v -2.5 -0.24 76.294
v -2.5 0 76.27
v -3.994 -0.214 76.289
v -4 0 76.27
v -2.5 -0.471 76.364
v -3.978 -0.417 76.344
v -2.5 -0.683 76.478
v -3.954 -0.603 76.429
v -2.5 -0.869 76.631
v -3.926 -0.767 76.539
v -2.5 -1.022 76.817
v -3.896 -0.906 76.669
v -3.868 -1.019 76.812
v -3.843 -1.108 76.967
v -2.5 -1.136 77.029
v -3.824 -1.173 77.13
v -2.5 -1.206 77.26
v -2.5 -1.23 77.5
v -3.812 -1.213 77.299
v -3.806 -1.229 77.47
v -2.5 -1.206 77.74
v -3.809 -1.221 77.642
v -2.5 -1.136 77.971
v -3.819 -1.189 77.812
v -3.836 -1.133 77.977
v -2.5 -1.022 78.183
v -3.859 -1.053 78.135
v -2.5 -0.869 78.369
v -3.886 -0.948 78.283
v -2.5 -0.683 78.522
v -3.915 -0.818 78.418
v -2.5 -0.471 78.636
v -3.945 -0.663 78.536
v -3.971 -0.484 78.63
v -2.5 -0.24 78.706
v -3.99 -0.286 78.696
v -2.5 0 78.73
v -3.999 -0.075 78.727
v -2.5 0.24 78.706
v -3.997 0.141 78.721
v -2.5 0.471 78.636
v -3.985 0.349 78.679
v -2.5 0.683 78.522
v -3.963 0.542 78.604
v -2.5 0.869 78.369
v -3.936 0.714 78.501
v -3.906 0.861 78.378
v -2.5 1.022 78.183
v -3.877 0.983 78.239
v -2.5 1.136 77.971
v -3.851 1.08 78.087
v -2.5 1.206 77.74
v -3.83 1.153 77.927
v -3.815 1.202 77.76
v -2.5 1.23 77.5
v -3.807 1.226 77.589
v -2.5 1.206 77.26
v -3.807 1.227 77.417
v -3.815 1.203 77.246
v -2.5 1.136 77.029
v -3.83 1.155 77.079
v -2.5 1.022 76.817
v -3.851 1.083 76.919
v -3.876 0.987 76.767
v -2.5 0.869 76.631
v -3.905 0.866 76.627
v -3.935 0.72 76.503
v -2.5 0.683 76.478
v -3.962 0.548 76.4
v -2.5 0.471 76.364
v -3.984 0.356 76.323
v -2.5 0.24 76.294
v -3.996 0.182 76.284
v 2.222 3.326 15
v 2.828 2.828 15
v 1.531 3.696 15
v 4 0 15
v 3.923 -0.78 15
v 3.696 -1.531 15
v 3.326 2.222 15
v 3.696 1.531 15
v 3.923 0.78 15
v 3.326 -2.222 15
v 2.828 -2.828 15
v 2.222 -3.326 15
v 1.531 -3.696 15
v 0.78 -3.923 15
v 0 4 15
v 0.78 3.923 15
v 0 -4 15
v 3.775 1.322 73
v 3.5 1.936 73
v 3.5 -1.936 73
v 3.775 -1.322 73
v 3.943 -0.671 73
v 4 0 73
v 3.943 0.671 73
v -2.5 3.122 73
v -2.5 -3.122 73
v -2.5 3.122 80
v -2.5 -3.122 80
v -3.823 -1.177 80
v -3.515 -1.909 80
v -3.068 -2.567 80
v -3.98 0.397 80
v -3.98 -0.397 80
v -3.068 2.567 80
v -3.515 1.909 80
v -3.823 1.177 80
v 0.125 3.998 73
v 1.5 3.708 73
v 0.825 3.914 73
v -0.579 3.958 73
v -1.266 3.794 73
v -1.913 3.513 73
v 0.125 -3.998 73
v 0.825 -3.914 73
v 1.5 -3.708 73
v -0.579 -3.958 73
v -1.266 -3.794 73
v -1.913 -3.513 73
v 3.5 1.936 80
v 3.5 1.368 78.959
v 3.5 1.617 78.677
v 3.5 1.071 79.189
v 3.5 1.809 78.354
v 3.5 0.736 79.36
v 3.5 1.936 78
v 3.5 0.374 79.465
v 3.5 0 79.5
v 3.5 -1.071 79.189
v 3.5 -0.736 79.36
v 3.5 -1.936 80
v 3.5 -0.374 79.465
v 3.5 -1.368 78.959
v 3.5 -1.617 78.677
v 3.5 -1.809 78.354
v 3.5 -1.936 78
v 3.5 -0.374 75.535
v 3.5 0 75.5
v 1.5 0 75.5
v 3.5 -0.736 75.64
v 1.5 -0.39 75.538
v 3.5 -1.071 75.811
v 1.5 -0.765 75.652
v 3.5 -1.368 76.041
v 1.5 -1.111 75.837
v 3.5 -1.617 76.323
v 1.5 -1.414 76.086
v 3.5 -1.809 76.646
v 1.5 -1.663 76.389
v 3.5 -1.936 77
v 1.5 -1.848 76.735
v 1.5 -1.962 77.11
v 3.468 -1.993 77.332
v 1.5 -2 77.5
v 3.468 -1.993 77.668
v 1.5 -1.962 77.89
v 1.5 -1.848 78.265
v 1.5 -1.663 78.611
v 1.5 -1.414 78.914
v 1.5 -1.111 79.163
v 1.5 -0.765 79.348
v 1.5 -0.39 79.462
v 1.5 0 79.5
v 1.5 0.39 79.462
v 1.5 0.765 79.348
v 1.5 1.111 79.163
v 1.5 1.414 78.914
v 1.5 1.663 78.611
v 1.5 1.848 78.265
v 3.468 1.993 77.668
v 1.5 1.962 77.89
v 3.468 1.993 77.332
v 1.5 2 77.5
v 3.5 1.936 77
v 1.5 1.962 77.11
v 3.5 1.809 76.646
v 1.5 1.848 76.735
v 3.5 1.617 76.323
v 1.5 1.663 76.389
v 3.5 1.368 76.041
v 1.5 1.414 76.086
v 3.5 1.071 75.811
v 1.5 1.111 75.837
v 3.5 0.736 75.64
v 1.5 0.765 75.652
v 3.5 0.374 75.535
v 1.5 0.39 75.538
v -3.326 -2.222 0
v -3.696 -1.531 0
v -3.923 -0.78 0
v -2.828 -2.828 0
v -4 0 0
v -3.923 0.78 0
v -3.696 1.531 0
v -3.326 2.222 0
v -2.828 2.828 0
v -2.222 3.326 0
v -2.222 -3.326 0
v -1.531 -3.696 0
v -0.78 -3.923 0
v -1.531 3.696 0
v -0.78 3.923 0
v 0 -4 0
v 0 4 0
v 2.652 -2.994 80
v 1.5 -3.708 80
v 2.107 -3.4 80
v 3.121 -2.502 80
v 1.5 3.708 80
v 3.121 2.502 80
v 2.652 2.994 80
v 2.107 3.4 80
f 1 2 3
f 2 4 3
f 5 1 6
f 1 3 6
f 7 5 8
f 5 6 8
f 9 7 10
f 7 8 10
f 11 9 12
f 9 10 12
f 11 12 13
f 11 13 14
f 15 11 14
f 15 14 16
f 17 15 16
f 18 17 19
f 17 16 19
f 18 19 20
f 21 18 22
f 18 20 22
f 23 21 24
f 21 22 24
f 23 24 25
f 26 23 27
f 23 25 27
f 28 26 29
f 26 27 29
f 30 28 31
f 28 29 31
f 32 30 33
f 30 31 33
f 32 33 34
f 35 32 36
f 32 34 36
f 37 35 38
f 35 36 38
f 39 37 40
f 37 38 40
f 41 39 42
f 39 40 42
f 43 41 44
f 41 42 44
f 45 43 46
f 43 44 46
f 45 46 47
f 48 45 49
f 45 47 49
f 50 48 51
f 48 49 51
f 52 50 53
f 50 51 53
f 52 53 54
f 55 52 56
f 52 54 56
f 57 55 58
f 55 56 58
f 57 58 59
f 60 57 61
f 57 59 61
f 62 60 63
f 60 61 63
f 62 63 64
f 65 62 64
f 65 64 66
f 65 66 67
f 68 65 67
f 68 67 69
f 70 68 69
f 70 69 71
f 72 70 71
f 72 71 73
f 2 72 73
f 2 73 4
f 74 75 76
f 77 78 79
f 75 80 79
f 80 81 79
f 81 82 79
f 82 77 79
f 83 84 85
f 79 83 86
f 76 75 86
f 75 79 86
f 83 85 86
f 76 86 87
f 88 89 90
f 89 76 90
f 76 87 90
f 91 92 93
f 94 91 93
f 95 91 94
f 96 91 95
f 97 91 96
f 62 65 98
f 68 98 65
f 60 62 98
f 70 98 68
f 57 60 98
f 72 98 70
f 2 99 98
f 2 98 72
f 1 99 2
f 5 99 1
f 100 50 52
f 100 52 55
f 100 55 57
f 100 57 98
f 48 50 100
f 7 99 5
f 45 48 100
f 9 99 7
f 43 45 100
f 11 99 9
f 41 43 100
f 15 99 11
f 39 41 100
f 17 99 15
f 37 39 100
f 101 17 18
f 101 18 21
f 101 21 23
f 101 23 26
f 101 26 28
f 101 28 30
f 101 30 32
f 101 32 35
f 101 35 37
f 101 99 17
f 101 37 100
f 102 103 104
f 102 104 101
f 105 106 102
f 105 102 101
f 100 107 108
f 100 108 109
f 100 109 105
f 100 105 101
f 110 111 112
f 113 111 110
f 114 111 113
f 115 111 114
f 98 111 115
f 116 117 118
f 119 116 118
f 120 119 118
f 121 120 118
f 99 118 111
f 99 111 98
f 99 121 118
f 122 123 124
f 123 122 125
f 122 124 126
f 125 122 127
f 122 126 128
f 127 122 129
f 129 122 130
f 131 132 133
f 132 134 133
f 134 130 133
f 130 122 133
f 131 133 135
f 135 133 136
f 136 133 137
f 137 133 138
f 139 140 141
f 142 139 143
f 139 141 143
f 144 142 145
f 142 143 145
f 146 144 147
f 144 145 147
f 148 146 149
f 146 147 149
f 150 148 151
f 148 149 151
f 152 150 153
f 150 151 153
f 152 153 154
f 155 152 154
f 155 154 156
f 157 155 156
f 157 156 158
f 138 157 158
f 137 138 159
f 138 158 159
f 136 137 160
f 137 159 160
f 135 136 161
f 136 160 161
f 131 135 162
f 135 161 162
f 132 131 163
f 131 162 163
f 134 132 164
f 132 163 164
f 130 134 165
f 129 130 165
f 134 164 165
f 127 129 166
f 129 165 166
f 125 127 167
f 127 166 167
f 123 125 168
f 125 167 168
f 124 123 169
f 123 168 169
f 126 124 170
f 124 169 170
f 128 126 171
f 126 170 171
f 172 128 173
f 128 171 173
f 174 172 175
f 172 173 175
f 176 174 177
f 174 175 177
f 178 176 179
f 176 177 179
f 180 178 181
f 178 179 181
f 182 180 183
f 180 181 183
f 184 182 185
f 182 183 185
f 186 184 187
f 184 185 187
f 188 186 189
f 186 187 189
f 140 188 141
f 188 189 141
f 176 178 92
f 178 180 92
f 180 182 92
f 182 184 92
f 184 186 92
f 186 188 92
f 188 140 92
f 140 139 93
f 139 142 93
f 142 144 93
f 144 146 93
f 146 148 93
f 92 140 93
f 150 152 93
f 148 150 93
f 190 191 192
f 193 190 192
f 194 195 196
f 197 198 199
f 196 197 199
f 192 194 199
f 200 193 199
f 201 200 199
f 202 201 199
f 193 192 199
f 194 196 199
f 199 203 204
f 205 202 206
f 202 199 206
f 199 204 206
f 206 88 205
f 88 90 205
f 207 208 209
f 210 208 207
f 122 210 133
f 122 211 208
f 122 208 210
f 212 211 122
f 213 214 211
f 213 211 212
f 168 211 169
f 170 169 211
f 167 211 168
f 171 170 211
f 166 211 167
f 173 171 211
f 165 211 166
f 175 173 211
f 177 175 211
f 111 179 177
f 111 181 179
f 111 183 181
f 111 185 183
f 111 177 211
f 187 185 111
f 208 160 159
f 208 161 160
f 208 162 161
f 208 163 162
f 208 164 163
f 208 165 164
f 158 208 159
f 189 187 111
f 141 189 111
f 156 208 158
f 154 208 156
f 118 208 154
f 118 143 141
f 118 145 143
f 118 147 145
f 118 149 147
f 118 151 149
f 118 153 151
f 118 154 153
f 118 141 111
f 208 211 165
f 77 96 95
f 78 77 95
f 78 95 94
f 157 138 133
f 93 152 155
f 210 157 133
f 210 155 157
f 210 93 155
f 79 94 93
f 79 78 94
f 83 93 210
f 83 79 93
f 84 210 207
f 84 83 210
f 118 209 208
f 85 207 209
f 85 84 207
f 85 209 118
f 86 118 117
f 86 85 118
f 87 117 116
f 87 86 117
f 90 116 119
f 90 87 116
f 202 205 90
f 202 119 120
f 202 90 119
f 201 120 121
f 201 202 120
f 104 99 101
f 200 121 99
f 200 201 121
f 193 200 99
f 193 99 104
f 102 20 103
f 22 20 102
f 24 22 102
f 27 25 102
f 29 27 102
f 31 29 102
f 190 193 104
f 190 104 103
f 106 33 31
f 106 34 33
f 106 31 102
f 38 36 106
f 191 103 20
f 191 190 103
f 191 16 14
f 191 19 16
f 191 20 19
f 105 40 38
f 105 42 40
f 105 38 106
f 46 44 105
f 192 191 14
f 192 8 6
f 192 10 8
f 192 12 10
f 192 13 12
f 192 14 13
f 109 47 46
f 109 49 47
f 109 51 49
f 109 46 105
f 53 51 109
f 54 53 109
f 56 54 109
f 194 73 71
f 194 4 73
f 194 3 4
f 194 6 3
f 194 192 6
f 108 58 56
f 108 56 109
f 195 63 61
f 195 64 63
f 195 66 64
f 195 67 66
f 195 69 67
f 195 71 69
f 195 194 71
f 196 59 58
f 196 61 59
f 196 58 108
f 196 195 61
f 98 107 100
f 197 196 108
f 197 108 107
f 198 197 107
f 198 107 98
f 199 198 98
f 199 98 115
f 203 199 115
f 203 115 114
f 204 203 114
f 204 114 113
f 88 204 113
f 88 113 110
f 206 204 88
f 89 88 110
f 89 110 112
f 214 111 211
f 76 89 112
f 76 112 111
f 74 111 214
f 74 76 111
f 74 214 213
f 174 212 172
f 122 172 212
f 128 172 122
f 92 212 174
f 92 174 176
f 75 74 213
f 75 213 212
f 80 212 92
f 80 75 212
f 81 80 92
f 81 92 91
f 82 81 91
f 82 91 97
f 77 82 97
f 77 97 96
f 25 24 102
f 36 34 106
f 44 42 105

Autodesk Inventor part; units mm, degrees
ref_plane "YZ Plane" through (0, 0, 0) normal (1, 0, 0) x (0, 1, 0)
ref_plane "XZ Plane" through (0, 0, 0) normal (0, 1, 0) x (-1, 0, 0)
ref_plane "XY Plane" through (0, 0, 0) normal (0, 0, 1) x (1, 0, 0)
sketch "Sketch1" plane through (0, 0, 0) normal (0, 0, 1) x (1, 0, 0)
  circle A0 centre (0, 0) radius 4
  dimension "d0" = 8
extrude "Extrusion1" add sketch "Sketch1" along normal blind 80
sketch "Sketch2" plane through (0, 0, 0) normal (0, 1, 0) x (-1, 0, 0)
  line L0 (0, 0) -> (-5.3393, 0)
  line L1 (-5.3393, 0) -> (-5.3393, 15)
  line L2 (-5.3393, 15) -> (0, 15)
  line L3 (0, 15) -> (0, 0)
  line L4 (2.5, 80) -> (-1.5, 80)
  line L5 (-1.5, 80) -> (-1.5, 73)
  line L6 (-1.5, 73) -> (2.5, 73)
  line L7 (2.5, 73) -> (2.5, 80)
  line L8 (4, 80) -> (-4, 80) construction
  line L9 (-4, 80) -> (-3.5, 80)
  line L10 (-3.5, 80) -> (-3.5, 73)
  line L11 (-3.5, 73) -> (-4, 73)
  line L12 (-4, 73) -> (-4, 80)
  point P0 (-3.75, 73)
  dimension "d3" = 4
  dimension "d4" = 7
  dimension "d5" = 2.5
  dimension "d6" = 15
  dimension "d9" = 2
extrude "Extrusion2" cut sketch "Sketch2" along normal through all both and the other way through all
sketch "Sketch3" plane through (3.5, -1.9365, 73) normal (1, 0, 0) x (0, 0, -1)
  circle A0 centre (-4.5, 1.9365) radius 1.5
  line L0 (-7, 0) -> (-7, 3.873) projected
  point P0 (73, 1.9365)
  point P1 (-7, 1.9365)
  dimension "d10" = 3
  dimension "d11" = 2.5
hole "Hole1" at (3.5, 0, 77.5) direction (-1, 0, 0) diameter 2.459 end through all counterbore diameter 4 counterbore depth 3 thread size "M3x0.5" class "6H" standard "ISO Metric profile"
properties part number "Servo_Strut_CPY_CPY"
